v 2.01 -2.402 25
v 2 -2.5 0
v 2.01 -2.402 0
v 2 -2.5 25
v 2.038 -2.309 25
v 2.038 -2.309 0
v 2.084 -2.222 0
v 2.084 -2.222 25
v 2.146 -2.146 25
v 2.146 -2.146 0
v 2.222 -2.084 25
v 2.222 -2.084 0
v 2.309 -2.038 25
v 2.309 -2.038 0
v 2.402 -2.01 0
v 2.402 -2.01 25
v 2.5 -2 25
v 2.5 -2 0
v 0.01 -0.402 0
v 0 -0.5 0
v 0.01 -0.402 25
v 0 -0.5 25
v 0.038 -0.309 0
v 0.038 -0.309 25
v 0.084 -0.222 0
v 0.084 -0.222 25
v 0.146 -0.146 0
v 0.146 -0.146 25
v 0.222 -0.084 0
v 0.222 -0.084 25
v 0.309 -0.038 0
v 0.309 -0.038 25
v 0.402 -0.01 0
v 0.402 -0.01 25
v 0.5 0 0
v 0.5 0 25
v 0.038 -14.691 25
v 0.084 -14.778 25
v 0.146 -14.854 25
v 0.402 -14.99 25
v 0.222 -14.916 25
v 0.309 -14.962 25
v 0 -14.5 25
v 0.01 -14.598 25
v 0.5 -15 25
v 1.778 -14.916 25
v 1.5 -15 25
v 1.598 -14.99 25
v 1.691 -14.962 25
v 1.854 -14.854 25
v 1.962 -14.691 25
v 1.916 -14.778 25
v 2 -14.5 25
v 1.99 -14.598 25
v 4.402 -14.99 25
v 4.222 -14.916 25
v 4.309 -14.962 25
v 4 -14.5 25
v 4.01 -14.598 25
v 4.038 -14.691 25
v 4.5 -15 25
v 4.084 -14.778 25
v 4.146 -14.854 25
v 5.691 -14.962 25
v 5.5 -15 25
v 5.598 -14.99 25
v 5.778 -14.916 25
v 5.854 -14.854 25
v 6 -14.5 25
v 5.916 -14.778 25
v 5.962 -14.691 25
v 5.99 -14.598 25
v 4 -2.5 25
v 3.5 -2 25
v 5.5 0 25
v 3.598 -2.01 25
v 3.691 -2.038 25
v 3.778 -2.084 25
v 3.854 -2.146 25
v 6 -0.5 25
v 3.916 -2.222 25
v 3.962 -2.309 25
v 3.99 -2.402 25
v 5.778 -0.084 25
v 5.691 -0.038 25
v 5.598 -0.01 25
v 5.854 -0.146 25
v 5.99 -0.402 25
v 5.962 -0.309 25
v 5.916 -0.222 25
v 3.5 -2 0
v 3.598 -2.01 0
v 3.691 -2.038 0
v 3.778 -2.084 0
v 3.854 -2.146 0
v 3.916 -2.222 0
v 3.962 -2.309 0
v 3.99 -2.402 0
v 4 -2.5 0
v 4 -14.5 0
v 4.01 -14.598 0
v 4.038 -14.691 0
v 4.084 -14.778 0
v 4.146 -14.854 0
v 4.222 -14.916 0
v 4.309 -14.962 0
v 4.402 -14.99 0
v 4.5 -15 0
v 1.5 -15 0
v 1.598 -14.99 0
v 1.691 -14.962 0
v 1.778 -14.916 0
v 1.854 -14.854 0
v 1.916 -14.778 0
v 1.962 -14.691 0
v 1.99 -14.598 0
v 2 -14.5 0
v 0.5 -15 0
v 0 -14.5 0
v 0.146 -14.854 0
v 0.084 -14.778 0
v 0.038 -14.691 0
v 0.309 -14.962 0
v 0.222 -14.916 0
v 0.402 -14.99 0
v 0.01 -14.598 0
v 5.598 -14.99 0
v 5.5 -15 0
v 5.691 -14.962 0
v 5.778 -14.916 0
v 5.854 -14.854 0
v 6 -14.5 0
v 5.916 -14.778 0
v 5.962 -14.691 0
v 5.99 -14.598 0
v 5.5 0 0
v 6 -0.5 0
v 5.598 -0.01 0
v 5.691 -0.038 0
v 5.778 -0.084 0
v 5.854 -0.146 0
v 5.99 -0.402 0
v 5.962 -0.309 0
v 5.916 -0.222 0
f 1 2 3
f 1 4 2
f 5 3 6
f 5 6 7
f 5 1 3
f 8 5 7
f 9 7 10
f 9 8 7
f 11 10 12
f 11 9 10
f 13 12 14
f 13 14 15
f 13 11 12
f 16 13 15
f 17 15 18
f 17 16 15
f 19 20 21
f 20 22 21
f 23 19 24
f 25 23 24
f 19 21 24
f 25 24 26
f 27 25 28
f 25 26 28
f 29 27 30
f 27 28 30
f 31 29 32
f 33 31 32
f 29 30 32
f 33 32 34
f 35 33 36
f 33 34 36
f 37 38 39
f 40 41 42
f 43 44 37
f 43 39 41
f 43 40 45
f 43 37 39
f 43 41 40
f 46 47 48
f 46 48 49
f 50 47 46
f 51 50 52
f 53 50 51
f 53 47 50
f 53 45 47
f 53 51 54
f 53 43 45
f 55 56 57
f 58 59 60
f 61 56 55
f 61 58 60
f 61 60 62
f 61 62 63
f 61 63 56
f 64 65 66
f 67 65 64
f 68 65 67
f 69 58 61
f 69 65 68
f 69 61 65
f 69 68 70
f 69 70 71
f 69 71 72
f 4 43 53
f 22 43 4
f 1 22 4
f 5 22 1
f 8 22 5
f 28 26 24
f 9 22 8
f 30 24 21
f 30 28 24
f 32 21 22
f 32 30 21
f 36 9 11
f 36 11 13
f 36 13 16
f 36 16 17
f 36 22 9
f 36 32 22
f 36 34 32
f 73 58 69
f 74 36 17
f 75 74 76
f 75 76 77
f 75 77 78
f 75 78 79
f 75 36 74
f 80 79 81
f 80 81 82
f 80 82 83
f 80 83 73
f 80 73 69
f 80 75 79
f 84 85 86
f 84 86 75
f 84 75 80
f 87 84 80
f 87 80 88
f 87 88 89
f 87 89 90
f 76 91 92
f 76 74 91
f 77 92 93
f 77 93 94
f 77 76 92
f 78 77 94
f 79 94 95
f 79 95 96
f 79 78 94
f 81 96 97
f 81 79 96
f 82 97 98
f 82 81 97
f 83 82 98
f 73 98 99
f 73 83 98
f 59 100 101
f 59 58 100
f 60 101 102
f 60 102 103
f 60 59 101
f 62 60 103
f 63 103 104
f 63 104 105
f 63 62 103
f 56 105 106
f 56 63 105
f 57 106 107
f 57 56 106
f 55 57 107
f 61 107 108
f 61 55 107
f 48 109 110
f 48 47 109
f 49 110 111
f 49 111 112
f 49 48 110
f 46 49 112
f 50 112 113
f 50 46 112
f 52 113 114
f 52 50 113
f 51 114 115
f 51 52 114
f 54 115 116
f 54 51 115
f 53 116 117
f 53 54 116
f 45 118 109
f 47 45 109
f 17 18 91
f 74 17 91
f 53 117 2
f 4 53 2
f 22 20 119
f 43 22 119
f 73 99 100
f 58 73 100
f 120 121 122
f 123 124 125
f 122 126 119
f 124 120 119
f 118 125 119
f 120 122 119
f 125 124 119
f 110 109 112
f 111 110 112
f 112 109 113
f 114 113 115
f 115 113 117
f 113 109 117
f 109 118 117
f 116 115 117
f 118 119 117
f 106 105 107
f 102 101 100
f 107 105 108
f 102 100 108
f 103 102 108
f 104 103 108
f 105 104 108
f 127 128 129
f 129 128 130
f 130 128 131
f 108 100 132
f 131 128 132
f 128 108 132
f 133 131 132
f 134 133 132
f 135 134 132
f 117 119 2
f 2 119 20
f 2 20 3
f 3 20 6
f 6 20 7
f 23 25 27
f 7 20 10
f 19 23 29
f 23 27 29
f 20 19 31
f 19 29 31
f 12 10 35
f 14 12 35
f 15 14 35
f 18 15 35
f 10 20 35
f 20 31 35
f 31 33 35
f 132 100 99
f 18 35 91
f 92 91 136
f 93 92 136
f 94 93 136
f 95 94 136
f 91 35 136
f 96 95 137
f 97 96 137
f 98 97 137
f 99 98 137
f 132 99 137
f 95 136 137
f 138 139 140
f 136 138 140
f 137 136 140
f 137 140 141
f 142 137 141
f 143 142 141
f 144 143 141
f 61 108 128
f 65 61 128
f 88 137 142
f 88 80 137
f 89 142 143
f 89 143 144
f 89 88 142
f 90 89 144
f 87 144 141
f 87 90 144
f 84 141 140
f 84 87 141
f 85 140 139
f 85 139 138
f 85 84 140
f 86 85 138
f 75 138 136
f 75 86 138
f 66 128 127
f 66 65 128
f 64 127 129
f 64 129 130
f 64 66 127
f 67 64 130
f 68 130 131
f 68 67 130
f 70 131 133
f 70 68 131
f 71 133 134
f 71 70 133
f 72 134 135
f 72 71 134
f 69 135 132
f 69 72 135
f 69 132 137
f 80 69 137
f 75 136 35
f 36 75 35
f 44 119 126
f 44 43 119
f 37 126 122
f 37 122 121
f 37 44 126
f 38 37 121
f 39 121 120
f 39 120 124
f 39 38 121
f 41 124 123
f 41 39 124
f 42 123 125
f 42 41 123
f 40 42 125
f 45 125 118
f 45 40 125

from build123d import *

# Parameters (mm, degrees)
F0_W     = 2
F0_H     = 2
F1_DEPTH = 25
F2_R     = 0.5


with BuildPart() as f1:
    # F0 (on Top) → F1 (new body)
    with BuildSketch(Plane.XY):
        Polygon((2, 0), (0, 0), (0, -15), (2, -15), (2, -2), align=None)
        with Locations((3, -1)):
            Rectangle(F0_W, F0_H)
        Polygon((6, 0), (4, 0), (4, -2), (4, -15), (6, -15), align=None)
    extrude(amount=F1_DEPTH)

    # F2
    f2_edges = [f1.edges().sort_by_distance(p)[0] for p in [
        (2, -2, 12.5),
        (4, -2, 12.5),
        (0, 0, 12.5),
        (6, 0, 12.5),
        (0, -15, 12.5),
        (2, -15, 12.5),
        (4, -15, 12.5),
        (6, -15, 12.5),
    ]]
    fillet(f2_edges, radius=F2_R)


solid = f1.part
